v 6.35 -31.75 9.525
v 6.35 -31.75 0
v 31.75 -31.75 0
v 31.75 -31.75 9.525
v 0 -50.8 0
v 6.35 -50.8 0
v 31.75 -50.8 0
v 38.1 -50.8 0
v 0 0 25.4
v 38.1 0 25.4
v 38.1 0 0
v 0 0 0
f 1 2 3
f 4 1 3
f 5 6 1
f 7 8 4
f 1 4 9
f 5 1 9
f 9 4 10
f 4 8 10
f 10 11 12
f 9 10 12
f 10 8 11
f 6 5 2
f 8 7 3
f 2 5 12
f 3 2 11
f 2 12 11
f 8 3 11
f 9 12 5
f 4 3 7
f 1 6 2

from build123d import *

# Parameters (mm, degrees)
F1_DEPTH = 25.4
F3_DEPTH = 38.101


with BuildPart() as f1:
    # F0 (on Top) → F1 (new body)
    with BuildSketch(Plane.XY):
        Polygon((38.1, 0), (0, 0), (0, -50.8), (6.35, -50.8), (6.35, -31.75), (31.75, -31.75), (31.75, -50.8), (38.1, -50.8), align=None)
    extrude(amount=F1_DEPTH)

    # F2 (on face) → F3 (cut, through all)
    with BuildSketch(Plane.YZ.offset(38.1)):
        Polygon((-50.8, 25.4), (-50.8, 0), (0, 25.4), align=None)
    extrude(amount=-F3_DEPTH, mode=Mode.SUBTRACT)


solid = f1.part
